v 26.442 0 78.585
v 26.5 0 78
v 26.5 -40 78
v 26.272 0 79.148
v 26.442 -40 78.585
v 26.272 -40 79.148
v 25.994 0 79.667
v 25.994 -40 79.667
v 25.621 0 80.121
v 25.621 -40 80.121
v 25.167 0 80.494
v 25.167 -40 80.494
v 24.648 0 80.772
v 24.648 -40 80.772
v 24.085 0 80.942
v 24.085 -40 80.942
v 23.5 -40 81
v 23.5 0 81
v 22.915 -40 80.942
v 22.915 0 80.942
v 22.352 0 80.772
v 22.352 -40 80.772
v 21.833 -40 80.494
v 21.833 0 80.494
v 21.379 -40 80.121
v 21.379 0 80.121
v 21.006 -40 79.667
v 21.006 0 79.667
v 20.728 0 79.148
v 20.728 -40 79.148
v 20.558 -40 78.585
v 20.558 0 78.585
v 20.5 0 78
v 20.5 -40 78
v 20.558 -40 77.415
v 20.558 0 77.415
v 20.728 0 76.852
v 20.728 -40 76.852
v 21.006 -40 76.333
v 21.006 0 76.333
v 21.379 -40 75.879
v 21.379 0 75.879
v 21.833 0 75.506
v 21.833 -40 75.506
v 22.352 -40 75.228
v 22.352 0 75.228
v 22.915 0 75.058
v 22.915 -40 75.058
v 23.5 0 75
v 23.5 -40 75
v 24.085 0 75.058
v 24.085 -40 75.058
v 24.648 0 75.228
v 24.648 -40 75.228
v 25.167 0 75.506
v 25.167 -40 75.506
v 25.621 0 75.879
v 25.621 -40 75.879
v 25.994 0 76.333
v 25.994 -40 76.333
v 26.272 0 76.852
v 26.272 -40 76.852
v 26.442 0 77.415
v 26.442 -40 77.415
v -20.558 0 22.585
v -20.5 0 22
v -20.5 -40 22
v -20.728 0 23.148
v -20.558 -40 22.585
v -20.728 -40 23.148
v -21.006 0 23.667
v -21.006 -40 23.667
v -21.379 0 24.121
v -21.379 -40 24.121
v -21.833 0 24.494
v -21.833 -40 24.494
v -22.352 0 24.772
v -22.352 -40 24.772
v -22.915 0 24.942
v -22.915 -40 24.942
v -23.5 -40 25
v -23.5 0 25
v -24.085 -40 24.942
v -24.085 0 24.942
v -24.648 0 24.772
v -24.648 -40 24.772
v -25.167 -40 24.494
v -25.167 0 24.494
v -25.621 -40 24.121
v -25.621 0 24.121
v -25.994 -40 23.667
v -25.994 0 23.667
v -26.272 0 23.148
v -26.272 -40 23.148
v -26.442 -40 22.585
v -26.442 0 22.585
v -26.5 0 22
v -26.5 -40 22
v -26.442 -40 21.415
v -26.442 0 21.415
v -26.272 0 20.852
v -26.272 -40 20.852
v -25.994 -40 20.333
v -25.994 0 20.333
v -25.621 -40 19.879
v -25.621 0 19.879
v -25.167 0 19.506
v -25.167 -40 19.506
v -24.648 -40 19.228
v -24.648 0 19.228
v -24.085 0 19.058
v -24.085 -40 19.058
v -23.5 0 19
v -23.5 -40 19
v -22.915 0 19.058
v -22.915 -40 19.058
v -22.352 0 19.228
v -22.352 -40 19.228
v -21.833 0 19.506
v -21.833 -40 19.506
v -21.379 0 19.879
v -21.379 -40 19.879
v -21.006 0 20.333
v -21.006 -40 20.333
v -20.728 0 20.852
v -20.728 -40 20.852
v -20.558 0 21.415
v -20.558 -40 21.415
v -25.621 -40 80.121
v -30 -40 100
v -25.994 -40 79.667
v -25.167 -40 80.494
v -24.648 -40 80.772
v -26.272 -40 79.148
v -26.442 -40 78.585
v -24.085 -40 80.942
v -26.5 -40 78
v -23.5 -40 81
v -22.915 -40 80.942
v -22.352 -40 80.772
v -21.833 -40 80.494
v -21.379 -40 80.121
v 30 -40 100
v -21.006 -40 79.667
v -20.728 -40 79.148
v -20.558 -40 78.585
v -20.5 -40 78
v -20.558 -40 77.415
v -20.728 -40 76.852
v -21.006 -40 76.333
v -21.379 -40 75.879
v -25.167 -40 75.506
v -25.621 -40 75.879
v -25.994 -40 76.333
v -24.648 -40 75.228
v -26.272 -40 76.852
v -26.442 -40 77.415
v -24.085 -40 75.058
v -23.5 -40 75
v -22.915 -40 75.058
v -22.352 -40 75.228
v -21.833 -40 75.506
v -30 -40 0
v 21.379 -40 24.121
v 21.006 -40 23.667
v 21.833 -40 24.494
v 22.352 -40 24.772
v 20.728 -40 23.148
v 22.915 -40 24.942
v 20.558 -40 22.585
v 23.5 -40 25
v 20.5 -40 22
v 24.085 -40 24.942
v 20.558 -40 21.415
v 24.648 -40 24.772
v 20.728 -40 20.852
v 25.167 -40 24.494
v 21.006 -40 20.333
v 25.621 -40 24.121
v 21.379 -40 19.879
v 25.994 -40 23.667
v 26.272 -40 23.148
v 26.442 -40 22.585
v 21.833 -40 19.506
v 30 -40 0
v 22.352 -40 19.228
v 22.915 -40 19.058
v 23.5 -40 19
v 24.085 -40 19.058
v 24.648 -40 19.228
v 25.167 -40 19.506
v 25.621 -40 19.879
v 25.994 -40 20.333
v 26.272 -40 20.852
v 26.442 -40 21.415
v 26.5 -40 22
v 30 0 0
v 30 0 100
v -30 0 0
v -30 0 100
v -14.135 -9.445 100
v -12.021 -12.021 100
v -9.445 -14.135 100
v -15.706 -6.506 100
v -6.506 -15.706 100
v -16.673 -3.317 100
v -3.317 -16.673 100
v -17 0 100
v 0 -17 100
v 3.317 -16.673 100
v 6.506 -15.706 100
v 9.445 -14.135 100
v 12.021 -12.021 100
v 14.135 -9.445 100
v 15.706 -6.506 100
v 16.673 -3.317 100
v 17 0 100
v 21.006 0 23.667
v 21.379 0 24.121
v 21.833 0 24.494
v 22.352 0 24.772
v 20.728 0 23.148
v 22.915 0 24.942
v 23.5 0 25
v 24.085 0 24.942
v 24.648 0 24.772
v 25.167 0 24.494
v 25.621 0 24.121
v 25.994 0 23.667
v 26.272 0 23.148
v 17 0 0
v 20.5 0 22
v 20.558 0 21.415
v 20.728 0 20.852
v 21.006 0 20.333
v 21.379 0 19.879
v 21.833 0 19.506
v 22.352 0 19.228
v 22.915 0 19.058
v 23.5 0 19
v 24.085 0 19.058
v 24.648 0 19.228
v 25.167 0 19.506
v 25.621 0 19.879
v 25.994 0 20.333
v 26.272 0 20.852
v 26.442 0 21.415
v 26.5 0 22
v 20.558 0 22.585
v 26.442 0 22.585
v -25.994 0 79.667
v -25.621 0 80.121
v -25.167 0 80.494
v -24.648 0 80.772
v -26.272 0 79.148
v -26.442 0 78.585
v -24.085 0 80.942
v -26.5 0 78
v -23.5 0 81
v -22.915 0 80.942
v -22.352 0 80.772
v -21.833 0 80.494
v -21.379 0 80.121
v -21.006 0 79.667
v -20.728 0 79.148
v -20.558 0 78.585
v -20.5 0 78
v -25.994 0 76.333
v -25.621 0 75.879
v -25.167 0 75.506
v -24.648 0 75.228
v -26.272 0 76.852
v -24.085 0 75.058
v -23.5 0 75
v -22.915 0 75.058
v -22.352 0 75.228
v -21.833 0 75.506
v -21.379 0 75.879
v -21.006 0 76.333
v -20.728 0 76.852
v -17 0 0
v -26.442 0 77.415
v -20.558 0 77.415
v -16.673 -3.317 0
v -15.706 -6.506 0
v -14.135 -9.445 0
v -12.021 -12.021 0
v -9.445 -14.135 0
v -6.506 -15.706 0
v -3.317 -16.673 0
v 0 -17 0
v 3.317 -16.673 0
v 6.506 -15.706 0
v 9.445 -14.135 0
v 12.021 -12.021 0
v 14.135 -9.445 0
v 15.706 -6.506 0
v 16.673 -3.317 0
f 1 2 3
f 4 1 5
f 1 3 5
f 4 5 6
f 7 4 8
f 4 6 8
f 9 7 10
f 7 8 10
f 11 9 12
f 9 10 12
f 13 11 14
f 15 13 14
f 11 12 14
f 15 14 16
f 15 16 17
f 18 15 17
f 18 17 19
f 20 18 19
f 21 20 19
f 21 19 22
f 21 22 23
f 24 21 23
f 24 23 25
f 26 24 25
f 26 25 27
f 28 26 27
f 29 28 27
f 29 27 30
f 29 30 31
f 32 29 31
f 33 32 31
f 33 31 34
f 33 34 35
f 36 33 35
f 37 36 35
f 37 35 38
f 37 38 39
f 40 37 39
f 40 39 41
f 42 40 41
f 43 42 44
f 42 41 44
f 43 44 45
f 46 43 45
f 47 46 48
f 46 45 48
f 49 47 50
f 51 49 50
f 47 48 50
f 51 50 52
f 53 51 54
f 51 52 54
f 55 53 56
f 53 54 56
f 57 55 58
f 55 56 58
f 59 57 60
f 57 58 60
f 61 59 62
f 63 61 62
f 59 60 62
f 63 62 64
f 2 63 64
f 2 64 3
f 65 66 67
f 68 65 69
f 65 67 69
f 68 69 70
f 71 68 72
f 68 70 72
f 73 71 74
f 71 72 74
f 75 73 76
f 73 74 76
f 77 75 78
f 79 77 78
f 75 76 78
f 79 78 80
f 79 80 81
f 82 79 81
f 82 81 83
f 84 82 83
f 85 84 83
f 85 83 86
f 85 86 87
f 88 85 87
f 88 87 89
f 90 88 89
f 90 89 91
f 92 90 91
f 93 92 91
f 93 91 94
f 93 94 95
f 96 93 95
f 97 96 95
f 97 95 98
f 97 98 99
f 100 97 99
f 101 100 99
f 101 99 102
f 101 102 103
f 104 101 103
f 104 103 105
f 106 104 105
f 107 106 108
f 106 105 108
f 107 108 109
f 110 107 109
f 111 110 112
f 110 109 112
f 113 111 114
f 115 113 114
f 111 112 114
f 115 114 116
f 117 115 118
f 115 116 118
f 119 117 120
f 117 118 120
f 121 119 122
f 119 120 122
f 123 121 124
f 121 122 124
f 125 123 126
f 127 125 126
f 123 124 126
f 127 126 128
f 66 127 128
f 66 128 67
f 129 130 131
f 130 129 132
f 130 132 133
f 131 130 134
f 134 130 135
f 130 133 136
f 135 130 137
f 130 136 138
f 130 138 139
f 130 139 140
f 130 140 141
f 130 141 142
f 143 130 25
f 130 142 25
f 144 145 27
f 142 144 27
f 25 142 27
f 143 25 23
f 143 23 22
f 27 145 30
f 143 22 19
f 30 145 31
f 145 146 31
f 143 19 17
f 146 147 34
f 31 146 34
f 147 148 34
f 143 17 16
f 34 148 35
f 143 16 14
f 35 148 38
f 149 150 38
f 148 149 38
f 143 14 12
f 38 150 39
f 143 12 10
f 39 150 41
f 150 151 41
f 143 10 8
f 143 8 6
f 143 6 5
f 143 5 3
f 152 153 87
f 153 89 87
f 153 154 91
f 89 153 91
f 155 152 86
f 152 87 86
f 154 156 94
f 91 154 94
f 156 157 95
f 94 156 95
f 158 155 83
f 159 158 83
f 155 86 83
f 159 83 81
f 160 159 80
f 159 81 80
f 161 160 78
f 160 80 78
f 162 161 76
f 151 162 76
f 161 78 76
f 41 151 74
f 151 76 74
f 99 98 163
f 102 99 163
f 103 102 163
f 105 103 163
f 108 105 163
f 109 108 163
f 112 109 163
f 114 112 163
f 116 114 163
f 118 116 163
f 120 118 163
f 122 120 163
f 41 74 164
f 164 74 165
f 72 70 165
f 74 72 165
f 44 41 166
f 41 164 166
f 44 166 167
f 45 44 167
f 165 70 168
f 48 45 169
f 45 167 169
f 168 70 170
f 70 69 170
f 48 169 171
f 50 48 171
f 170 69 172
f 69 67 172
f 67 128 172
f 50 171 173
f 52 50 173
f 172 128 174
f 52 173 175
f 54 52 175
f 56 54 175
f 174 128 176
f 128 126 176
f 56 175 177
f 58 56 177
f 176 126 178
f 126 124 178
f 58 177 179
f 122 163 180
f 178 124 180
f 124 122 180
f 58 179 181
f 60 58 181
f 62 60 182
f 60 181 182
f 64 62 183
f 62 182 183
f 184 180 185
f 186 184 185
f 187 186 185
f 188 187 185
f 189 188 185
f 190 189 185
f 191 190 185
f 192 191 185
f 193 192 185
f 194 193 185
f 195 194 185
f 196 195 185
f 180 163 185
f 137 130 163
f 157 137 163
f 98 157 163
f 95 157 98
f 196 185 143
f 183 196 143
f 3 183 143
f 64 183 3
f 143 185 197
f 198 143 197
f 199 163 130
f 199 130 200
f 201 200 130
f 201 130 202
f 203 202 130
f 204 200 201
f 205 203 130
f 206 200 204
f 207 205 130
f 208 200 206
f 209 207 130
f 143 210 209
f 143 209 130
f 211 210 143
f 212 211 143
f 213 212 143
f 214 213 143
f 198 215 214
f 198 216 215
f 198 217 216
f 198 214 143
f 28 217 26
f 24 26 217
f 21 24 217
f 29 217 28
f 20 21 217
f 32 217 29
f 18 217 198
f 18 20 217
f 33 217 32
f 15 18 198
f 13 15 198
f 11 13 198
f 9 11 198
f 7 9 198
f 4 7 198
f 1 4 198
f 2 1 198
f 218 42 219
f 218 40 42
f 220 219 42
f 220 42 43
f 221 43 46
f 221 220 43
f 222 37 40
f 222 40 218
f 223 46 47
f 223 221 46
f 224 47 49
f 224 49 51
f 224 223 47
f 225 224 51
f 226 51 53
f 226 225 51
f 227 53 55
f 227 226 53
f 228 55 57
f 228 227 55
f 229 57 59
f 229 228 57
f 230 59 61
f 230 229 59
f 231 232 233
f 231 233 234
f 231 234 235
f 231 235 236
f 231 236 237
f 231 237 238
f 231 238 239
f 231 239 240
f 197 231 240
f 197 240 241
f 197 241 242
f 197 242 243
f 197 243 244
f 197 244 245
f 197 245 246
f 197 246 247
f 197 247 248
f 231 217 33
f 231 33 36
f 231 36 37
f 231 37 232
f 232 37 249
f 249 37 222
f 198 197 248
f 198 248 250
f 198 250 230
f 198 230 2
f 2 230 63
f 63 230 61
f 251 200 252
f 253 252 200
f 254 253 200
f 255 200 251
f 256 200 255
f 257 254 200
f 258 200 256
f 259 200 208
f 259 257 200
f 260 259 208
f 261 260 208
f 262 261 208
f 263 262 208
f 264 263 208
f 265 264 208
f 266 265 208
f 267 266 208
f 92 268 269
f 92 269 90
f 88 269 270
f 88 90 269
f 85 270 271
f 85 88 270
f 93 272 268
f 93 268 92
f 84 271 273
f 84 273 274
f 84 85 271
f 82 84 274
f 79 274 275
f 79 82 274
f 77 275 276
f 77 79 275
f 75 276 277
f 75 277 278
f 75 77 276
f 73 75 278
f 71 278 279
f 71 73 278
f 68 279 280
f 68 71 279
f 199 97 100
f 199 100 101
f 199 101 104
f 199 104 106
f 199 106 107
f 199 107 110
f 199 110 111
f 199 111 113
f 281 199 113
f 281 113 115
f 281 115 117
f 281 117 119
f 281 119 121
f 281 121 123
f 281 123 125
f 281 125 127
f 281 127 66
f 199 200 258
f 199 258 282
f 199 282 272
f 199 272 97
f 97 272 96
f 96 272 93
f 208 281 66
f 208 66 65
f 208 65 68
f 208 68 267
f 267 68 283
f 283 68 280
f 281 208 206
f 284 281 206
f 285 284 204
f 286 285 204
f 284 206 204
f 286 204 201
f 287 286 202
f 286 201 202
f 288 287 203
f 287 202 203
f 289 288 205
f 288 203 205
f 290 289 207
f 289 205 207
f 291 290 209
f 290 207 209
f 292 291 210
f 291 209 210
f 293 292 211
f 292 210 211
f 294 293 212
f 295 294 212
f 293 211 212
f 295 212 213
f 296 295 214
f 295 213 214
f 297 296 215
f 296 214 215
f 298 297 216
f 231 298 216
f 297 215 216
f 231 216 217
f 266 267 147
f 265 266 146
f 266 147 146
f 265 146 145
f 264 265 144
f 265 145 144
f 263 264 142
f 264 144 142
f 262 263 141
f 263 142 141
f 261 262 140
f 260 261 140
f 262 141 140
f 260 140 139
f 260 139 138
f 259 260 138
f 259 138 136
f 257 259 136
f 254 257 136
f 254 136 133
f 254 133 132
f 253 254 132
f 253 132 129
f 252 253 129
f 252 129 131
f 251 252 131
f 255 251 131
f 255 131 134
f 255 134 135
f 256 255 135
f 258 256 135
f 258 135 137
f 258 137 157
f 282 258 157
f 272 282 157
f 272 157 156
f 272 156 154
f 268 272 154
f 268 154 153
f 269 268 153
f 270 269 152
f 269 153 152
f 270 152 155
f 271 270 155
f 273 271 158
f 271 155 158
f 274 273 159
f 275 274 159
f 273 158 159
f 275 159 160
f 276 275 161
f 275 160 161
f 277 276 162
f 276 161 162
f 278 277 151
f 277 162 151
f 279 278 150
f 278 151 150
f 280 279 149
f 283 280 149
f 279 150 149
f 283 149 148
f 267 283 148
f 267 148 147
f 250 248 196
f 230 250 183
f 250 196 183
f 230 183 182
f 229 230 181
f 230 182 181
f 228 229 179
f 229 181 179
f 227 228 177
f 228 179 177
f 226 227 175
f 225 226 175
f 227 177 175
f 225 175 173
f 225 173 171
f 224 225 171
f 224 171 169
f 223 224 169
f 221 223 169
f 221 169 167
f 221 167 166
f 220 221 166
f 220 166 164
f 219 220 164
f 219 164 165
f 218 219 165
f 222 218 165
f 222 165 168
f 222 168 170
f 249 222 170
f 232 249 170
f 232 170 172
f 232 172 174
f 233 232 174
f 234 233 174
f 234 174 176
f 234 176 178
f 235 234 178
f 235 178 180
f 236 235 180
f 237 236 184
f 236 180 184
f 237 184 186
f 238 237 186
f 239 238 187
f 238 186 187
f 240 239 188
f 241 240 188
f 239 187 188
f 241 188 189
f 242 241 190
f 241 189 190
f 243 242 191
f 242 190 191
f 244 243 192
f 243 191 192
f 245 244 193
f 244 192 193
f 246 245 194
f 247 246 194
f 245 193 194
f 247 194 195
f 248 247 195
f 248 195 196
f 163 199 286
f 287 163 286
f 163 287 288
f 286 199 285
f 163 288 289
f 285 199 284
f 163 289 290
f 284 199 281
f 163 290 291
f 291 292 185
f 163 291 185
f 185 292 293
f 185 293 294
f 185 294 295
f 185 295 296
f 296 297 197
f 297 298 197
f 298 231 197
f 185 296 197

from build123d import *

# Parameters (mm, degrees)
F0_W     = 60
F0_H     = 40
F1_DEPTH = 100
F2_R     = 17
F3_DEPTH = 100
F4_R     = 3
F5_DEPTH = 45


with BuildPart() as f1:
    # F0 (on Top) → F1 (new body)
    with BuildSketch(Plane.XY):
        with Locations((0, -20)):
            Rectangle(F0_W, F0_H)
    extrude(amount=F1_DEPTH)

    # F2 (on face) → F3 (cut)
    with BuildSketch(Plane.XY.offset(100)):
        Circle(F2_R)
    extrude(amount=-F3_DEPTH, mode=Mode.SUBTRACT)

    # F4 (on face) → F5 (cut)
    with BuildSketch(Plane.XZ.offset(40)):
        with Locations((-23.5, 78)):
            Circle(F4_R)
        with Locations((-23.5, 22)):
            Circle(F4_R)
        with Locations((23.5, 22)):
            Circle(F4_R)
        with Locations((23.5, 78)):
            Circle(F4_R)
    extrude(amount=-F5_DEPTH, mode=Mode.SUBTRACT)


solid = f1.part
